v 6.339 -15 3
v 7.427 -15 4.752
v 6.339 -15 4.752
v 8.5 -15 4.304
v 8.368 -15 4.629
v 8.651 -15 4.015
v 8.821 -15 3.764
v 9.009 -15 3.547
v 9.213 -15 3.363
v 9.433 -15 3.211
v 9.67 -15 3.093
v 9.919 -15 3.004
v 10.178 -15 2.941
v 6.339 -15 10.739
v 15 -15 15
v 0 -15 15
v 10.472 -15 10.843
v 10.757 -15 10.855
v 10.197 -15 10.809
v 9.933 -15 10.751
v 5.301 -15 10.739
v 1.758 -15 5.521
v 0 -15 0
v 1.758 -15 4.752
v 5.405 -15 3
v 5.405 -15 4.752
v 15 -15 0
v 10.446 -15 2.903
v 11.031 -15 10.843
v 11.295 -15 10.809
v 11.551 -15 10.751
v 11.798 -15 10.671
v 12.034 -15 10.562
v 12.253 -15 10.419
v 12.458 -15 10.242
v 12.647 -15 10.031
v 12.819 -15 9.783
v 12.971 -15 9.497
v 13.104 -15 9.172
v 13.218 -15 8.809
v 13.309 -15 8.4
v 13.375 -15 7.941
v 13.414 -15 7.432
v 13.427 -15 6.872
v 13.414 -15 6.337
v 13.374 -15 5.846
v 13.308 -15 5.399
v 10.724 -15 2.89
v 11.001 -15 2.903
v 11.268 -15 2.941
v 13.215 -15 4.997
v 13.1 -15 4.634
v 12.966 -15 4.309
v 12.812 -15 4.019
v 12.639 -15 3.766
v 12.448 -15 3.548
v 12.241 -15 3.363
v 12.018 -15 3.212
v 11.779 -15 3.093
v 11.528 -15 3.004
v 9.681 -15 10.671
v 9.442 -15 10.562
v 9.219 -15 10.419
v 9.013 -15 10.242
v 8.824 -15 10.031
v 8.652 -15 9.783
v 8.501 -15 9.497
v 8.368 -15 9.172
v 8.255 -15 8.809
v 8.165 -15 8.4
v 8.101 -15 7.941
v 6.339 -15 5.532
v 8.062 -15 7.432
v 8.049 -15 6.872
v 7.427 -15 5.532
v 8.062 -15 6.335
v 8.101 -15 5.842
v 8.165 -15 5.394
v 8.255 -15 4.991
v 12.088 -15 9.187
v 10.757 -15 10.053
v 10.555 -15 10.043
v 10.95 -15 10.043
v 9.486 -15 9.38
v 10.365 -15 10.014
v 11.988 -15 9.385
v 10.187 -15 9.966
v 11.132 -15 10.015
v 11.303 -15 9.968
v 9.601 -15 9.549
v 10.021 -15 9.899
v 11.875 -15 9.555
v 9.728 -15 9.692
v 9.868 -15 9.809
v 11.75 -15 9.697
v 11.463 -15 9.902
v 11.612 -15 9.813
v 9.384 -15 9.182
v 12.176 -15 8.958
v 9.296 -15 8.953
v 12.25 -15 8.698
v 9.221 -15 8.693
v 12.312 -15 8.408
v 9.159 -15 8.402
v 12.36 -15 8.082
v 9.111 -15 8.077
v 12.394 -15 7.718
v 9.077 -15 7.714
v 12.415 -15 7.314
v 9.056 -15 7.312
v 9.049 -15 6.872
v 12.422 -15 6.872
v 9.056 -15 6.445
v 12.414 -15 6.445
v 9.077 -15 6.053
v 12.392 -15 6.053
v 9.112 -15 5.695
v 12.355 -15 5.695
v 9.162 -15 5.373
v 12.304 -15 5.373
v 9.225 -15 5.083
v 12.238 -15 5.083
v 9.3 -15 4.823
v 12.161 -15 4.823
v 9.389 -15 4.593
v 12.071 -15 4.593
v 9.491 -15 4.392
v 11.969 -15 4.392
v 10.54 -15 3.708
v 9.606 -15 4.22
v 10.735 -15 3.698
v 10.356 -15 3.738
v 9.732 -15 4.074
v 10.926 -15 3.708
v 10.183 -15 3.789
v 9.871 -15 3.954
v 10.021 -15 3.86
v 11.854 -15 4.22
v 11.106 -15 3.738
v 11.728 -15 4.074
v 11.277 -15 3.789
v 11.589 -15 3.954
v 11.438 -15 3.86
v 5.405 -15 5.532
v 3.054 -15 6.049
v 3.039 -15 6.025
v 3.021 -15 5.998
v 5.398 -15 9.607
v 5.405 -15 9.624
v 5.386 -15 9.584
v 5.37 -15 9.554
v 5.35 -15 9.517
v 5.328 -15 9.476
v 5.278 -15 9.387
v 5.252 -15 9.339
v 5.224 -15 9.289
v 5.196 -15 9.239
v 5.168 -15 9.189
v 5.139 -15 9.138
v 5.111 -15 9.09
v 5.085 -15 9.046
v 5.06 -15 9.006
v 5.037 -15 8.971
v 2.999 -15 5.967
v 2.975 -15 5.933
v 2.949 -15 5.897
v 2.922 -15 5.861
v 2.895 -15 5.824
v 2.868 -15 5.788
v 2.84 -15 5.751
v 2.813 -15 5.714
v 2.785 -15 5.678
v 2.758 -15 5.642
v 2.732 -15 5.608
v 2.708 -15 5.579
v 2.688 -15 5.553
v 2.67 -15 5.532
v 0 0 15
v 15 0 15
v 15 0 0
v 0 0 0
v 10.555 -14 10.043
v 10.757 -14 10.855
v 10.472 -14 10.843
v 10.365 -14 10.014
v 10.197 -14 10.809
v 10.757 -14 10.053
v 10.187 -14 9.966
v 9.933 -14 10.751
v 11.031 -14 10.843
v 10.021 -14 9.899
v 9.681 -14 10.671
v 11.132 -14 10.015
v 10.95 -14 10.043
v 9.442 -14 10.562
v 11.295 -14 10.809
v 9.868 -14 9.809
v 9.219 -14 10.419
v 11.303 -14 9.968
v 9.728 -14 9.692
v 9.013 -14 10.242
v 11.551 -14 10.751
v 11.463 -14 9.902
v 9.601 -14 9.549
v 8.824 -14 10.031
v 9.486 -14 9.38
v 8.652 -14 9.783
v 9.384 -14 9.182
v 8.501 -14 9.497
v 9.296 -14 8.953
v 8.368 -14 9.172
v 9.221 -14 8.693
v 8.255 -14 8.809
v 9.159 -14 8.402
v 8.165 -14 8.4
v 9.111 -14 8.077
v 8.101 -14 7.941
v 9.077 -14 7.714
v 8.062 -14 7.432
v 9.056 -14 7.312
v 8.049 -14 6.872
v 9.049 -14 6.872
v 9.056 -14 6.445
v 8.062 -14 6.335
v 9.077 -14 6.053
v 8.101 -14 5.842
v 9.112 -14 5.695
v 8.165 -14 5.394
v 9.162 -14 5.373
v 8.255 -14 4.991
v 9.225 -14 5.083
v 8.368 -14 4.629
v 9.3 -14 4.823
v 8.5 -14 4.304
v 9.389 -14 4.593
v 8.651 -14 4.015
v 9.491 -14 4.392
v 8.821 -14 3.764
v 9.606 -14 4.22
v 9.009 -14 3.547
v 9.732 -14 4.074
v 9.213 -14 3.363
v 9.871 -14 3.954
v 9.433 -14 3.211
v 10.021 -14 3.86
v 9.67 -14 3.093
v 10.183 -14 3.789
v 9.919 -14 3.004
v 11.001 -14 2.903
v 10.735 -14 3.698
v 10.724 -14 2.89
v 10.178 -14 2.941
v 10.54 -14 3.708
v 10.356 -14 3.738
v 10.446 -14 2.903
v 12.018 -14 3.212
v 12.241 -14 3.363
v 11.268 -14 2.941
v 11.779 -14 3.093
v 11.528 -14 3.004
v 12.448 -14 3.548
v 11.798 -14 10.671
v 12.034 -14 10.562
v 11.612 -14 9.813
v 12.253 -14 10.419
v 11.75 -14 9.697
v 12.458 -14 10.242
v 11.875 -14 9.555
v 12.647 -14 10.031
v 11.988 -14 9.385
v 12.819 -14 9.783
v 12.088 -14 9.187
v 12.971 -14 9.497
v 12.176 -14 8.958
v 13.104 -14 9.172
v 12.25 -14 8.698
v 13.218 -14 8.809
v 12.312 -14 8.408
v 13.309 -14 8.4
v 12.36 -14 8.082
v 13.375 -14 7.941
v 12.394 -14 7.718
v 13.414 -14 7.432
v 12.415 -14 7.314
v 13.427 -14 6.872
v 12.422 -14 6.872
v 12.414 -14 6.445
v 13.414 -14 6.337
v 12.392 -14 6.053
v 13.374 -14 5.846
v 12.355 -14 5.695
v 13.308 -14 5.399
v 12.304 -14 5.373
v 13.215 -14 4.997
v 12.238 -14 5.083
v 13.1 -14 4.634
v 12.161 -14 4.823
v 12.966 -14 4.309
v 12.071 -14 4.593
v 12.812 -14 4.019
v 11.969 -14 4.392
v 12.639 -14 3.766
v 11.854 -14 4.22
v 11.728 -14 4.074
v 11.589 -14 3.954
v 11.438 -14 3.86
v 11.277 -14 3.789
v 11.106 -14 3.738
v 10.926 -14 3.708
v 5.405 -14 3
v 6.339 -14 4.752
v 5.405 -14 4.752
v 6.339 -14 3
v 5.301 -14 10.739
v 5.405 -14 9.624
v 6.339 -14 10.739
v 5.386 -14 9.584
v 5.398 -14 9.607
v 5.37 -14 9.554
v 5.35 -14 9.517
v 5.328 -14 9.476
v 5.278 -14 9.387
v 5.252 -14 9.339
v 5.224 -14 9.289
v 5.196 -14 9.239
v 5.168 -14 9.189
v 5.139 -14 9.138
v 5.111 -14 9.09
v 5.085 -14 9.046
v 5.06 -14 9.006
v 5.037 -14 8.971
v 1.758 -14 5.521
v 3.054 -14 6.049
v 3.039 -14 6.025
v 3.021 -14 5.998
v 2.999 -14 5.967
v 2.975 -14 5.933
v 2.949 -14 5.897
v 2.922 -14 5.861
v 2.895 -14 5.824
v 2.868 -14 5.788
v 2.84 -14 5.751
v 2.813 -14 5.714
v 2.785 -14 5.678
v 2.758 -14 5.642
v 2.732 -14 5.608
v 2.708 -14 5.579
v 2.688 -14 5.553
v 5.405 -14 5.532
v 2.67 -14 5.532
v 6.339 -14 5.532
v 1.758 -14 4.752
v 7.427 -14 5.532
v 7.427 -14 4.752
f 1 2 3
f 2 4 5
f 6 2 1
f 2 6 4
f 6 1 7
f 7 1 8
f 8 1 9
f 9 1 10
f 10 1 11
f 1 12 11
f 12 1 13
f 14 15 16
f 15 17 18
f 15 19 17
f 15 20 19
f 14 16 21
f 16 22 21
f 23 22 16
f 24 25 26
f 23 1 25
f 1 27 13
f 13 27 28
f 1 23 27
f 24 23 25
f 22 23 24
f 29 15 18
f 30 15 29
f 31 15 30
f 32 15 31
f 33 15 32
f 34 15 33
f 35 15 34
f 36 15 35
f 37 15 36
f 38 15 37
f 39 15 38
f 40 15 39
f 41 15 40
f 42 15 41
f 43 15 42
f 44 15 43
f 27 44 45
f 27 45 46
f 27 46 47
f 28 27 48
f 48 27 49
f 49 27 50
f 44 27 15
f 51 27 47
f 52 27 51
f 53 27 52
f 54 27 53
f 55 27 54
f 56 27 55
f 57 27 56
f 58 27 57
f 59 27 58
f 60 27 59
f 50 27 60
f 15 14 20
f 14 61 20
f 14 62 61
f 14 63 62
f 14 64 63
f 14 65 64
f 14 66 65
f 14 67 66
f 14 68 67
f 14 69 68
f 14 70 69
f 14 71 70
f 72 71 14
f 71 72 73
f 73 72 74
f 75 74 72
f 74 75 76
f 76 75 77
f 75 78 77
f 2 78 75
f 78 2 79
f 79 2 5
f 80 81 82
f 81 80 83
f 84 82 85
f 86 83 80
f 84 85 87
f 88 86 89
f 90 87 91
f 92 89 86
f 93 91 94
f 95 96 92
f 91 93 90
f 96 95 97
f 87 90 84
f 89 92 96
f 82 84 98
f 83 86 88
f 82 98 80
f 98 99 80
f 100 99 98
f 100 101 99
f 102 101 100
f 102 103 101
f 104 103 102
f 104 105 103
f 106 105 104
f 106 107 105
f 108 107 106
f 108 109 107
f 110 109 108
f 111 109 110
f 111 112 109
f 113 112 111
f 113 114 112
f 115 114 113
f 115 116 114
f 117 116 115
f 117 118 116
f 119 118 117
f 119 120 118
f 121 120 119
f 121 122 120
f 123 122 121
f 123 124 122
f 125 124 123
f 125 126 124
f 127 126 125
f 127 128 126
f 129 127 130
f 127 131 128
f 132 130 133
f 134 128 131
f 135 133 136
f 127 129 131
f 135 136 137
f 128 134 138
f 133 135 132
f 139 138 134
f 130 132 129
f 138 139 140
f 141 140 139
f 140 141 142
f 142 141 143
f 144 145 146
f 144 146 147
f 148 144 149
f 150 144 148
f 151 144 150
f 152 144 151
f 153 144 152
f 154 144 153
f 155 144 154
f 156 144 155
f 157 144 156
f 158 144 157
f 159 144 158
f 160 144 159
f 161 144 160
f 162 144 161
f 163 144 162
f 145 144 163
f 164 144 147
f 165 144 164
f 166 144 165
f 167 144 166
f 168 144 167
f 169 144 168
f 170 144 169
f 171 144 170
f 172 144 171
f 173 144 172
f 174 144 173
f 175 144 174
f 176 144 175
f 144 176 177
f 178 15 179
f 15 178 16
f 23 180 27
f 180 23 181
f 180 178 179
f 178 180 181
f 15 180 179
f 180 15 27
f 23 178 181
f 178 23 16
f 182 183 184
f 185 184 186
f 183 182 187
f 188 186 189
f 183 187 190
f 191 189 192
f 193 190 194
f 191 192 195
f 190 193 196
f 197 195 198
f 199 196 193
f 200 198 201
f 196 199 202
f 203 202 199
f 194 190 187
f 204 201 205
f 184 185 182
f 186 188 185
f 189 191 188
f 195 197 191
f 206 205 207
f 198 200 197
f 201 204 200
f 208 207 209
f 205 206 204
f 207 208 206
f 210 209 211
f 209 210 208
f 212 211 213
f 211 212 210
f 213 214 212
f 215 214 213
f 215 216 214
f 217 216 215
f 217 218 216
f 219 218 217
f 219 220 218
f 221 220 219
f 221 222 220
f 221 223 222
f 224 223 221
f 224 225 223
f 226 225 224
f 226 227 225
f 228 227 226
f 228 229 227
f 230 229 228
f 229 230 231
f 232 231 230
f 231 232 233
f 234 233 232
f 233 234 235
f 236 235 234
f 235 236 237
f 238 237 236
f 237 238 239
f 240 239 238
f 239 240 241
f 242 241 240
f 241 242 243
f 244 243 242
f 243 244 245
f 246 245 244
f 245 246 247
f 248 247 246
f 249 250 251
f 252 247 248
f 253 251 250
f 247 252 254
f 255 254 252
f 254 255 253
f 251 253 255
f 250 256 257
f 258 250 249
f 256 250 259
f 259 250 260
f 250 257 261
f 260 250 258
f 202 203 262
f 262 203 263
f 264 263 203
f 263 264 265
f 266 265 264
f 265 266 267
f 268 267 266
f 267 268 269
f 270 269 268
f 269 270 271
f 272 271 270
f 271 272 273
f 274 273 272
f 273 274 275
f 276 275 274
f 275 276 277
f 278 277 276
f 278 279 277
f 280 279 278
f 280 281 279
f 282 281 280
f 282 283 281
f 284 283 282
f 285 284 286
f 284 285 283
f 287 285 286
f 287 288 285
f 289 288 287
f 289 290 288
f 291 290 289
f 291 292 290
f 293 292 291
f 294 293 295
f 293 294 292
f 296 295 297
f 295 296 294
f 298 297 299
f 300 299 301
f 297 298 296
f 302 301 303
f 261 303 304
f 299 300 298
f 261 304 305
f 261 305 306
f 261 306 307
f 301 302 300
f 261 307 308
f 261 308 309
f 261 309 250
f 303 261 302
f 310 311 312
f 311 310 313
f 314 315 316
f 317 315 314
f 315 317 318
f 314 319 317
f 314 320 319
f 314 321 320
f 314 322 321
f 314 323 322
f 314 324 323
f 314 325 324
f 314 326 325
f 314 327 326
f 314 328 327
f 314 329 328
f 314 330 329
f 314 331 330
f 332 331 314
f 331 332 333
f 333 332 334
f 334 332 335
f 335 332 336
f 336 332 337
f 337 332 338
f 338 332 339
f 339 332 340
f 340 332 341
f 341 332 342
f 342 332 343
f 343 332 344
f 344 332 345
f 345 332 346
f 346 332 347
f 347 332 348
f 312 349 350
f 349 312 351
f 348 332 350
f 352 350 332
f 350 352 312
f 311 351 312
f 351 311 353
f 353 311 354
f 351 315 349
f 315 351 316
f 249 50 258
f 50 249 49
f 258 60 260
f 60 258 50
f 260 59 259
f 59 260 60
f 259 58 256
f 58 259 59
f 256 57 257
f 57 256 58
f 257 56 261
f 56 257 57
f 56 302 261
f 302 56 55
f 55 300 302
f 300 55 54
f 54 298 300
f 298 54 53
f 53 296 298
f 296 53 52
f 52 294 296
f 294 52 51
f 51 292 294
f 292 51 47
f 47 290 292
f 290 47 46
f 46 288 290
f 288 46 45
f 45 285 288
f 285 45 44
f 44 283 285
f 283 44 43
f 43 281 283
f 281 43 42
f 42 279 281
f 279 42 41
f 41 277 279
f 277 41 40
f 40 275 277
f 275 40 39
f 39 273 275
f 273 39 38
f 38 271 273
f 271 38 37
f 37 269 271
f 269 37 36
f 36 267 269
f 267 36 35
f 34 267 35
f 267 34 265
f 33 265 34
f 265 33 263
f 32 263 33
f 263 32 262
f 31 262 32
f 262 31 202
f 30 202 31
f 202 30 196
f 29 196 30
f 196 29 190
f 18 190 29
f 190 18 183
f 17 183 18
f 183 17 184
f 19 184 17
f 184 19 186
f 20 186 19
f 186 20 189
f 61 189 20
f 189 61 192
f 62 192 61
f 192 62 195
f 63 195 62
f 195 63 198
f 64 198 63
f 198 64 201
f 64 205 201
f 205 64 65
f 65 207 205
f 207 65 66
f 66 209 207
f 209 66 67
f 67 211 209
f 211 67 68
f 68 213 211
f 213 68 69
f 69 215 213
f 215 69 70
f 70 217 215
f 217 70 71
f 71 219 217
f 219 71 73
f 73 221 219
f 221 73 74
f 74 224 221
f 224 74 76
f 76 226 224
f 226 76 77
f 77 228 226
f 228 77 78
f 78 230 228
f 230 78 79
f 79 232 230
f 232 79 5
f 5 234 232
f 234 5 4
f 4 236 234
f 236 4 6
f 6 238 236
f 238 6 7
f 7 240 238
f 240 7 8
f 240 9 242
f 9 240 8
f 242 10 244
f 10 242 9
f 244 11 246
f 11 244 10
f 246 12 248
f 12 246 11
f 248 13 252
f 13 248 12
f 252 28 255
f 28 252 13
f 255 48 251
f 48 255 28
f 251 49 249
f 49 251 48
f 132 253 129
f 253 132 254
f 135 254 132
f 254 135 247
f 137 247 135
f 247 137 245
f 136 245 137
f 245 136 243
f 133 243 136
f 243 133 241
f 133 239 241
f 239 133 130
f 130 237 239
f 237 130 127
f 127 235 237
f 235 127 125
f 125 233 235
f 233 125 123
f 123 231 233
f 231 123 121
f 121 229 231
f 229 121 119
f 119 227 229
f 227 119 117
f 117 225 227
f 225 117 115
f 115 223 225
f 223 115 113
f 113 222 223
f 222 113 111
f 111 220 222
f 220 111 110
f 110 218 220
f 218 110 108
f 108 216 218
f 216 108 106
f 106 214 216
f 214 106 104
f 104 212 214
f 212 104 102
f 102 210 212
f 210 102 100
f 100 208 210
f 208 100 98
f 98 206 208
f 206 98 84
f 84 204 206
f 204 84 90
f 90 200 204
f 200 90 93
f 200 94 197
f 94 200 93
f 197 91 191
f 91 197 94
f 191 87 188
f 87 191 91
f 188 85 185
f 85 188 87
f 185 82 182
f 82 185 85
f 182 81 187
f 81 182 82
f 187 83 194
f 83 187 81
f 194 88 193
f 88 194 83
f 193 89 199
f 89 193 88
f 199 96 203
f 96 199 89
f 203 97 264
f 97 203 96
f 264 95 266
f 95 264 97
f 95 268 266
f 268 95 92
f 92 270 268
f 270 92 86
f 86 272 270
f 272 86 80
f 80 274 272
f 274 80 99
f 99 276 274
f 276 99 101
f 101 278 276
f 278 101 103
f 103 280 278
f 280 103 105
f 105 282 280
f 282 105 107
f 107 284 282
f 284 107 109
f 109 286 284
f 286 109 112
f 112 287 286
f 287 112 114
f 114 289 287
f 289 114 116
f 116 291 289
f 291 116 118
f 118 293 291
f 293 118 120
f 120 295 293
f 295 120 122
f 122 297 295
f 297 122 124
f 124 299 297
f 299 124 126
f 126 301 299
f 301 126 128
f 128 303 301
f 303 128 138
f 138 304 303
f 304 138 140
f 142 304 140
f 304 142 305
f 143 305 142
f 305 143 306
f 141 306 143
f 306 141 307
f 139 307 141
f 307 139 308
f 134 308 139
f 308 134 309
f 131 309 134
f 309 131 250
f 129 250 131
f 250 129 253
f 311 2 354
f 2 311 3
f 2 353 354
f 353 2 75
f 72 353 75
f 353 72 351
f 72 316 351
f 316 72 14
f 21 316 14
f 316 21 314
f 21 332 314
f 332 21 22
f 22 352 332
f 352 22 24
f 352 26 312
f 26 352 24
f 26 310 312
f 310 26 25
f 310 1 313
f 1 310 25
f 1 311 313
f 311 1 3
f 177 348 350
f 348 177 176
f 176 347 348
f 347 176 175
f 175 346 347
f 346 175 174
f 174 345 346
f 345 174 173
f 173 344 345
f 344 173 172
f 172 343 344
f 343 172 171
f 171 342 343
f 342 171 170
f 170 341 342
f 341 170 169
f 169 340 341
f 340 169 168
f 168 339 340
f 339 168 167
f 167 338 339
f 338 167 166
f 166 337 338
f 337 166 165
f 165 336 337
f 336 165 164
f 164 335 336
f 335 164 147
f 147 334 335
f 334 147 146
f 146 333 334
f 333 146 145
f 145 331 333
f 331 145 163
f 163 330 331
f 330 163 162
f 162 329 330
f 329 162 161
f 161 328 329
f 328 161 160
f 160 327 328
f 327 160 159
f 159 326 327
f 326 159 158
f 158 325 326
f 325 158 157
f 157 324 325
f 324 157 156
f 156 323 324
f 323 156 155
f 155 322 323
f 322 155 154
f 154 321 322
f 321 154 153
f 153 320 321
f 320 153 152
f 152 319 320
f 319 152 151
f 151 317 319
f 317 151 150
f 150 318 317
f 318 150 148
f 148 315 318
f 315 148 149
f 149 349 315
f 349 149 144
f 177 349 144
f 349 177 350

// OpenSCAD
// font
font1 = "Liberation Sans"; 

// Face Text
content = "40";

//scale
scale = 3;

rotate([0,0,-90]){
difference(){
    cube_ratio = 5;
    cube([scale*cube_ratio,scale*cube_ratio,scale*cube_ratio]);

    translate ([scale * cube_ratio - 1,.5 * scale,1 * scale]) {
        rotate ([90,0,90]) {
            linear_extrude(height = 2) {
                text(content, font = font1, 
                    size = 3*scale *.9, direction = "ltr", spacing = 1 );
            }
        }
    }
}
}
